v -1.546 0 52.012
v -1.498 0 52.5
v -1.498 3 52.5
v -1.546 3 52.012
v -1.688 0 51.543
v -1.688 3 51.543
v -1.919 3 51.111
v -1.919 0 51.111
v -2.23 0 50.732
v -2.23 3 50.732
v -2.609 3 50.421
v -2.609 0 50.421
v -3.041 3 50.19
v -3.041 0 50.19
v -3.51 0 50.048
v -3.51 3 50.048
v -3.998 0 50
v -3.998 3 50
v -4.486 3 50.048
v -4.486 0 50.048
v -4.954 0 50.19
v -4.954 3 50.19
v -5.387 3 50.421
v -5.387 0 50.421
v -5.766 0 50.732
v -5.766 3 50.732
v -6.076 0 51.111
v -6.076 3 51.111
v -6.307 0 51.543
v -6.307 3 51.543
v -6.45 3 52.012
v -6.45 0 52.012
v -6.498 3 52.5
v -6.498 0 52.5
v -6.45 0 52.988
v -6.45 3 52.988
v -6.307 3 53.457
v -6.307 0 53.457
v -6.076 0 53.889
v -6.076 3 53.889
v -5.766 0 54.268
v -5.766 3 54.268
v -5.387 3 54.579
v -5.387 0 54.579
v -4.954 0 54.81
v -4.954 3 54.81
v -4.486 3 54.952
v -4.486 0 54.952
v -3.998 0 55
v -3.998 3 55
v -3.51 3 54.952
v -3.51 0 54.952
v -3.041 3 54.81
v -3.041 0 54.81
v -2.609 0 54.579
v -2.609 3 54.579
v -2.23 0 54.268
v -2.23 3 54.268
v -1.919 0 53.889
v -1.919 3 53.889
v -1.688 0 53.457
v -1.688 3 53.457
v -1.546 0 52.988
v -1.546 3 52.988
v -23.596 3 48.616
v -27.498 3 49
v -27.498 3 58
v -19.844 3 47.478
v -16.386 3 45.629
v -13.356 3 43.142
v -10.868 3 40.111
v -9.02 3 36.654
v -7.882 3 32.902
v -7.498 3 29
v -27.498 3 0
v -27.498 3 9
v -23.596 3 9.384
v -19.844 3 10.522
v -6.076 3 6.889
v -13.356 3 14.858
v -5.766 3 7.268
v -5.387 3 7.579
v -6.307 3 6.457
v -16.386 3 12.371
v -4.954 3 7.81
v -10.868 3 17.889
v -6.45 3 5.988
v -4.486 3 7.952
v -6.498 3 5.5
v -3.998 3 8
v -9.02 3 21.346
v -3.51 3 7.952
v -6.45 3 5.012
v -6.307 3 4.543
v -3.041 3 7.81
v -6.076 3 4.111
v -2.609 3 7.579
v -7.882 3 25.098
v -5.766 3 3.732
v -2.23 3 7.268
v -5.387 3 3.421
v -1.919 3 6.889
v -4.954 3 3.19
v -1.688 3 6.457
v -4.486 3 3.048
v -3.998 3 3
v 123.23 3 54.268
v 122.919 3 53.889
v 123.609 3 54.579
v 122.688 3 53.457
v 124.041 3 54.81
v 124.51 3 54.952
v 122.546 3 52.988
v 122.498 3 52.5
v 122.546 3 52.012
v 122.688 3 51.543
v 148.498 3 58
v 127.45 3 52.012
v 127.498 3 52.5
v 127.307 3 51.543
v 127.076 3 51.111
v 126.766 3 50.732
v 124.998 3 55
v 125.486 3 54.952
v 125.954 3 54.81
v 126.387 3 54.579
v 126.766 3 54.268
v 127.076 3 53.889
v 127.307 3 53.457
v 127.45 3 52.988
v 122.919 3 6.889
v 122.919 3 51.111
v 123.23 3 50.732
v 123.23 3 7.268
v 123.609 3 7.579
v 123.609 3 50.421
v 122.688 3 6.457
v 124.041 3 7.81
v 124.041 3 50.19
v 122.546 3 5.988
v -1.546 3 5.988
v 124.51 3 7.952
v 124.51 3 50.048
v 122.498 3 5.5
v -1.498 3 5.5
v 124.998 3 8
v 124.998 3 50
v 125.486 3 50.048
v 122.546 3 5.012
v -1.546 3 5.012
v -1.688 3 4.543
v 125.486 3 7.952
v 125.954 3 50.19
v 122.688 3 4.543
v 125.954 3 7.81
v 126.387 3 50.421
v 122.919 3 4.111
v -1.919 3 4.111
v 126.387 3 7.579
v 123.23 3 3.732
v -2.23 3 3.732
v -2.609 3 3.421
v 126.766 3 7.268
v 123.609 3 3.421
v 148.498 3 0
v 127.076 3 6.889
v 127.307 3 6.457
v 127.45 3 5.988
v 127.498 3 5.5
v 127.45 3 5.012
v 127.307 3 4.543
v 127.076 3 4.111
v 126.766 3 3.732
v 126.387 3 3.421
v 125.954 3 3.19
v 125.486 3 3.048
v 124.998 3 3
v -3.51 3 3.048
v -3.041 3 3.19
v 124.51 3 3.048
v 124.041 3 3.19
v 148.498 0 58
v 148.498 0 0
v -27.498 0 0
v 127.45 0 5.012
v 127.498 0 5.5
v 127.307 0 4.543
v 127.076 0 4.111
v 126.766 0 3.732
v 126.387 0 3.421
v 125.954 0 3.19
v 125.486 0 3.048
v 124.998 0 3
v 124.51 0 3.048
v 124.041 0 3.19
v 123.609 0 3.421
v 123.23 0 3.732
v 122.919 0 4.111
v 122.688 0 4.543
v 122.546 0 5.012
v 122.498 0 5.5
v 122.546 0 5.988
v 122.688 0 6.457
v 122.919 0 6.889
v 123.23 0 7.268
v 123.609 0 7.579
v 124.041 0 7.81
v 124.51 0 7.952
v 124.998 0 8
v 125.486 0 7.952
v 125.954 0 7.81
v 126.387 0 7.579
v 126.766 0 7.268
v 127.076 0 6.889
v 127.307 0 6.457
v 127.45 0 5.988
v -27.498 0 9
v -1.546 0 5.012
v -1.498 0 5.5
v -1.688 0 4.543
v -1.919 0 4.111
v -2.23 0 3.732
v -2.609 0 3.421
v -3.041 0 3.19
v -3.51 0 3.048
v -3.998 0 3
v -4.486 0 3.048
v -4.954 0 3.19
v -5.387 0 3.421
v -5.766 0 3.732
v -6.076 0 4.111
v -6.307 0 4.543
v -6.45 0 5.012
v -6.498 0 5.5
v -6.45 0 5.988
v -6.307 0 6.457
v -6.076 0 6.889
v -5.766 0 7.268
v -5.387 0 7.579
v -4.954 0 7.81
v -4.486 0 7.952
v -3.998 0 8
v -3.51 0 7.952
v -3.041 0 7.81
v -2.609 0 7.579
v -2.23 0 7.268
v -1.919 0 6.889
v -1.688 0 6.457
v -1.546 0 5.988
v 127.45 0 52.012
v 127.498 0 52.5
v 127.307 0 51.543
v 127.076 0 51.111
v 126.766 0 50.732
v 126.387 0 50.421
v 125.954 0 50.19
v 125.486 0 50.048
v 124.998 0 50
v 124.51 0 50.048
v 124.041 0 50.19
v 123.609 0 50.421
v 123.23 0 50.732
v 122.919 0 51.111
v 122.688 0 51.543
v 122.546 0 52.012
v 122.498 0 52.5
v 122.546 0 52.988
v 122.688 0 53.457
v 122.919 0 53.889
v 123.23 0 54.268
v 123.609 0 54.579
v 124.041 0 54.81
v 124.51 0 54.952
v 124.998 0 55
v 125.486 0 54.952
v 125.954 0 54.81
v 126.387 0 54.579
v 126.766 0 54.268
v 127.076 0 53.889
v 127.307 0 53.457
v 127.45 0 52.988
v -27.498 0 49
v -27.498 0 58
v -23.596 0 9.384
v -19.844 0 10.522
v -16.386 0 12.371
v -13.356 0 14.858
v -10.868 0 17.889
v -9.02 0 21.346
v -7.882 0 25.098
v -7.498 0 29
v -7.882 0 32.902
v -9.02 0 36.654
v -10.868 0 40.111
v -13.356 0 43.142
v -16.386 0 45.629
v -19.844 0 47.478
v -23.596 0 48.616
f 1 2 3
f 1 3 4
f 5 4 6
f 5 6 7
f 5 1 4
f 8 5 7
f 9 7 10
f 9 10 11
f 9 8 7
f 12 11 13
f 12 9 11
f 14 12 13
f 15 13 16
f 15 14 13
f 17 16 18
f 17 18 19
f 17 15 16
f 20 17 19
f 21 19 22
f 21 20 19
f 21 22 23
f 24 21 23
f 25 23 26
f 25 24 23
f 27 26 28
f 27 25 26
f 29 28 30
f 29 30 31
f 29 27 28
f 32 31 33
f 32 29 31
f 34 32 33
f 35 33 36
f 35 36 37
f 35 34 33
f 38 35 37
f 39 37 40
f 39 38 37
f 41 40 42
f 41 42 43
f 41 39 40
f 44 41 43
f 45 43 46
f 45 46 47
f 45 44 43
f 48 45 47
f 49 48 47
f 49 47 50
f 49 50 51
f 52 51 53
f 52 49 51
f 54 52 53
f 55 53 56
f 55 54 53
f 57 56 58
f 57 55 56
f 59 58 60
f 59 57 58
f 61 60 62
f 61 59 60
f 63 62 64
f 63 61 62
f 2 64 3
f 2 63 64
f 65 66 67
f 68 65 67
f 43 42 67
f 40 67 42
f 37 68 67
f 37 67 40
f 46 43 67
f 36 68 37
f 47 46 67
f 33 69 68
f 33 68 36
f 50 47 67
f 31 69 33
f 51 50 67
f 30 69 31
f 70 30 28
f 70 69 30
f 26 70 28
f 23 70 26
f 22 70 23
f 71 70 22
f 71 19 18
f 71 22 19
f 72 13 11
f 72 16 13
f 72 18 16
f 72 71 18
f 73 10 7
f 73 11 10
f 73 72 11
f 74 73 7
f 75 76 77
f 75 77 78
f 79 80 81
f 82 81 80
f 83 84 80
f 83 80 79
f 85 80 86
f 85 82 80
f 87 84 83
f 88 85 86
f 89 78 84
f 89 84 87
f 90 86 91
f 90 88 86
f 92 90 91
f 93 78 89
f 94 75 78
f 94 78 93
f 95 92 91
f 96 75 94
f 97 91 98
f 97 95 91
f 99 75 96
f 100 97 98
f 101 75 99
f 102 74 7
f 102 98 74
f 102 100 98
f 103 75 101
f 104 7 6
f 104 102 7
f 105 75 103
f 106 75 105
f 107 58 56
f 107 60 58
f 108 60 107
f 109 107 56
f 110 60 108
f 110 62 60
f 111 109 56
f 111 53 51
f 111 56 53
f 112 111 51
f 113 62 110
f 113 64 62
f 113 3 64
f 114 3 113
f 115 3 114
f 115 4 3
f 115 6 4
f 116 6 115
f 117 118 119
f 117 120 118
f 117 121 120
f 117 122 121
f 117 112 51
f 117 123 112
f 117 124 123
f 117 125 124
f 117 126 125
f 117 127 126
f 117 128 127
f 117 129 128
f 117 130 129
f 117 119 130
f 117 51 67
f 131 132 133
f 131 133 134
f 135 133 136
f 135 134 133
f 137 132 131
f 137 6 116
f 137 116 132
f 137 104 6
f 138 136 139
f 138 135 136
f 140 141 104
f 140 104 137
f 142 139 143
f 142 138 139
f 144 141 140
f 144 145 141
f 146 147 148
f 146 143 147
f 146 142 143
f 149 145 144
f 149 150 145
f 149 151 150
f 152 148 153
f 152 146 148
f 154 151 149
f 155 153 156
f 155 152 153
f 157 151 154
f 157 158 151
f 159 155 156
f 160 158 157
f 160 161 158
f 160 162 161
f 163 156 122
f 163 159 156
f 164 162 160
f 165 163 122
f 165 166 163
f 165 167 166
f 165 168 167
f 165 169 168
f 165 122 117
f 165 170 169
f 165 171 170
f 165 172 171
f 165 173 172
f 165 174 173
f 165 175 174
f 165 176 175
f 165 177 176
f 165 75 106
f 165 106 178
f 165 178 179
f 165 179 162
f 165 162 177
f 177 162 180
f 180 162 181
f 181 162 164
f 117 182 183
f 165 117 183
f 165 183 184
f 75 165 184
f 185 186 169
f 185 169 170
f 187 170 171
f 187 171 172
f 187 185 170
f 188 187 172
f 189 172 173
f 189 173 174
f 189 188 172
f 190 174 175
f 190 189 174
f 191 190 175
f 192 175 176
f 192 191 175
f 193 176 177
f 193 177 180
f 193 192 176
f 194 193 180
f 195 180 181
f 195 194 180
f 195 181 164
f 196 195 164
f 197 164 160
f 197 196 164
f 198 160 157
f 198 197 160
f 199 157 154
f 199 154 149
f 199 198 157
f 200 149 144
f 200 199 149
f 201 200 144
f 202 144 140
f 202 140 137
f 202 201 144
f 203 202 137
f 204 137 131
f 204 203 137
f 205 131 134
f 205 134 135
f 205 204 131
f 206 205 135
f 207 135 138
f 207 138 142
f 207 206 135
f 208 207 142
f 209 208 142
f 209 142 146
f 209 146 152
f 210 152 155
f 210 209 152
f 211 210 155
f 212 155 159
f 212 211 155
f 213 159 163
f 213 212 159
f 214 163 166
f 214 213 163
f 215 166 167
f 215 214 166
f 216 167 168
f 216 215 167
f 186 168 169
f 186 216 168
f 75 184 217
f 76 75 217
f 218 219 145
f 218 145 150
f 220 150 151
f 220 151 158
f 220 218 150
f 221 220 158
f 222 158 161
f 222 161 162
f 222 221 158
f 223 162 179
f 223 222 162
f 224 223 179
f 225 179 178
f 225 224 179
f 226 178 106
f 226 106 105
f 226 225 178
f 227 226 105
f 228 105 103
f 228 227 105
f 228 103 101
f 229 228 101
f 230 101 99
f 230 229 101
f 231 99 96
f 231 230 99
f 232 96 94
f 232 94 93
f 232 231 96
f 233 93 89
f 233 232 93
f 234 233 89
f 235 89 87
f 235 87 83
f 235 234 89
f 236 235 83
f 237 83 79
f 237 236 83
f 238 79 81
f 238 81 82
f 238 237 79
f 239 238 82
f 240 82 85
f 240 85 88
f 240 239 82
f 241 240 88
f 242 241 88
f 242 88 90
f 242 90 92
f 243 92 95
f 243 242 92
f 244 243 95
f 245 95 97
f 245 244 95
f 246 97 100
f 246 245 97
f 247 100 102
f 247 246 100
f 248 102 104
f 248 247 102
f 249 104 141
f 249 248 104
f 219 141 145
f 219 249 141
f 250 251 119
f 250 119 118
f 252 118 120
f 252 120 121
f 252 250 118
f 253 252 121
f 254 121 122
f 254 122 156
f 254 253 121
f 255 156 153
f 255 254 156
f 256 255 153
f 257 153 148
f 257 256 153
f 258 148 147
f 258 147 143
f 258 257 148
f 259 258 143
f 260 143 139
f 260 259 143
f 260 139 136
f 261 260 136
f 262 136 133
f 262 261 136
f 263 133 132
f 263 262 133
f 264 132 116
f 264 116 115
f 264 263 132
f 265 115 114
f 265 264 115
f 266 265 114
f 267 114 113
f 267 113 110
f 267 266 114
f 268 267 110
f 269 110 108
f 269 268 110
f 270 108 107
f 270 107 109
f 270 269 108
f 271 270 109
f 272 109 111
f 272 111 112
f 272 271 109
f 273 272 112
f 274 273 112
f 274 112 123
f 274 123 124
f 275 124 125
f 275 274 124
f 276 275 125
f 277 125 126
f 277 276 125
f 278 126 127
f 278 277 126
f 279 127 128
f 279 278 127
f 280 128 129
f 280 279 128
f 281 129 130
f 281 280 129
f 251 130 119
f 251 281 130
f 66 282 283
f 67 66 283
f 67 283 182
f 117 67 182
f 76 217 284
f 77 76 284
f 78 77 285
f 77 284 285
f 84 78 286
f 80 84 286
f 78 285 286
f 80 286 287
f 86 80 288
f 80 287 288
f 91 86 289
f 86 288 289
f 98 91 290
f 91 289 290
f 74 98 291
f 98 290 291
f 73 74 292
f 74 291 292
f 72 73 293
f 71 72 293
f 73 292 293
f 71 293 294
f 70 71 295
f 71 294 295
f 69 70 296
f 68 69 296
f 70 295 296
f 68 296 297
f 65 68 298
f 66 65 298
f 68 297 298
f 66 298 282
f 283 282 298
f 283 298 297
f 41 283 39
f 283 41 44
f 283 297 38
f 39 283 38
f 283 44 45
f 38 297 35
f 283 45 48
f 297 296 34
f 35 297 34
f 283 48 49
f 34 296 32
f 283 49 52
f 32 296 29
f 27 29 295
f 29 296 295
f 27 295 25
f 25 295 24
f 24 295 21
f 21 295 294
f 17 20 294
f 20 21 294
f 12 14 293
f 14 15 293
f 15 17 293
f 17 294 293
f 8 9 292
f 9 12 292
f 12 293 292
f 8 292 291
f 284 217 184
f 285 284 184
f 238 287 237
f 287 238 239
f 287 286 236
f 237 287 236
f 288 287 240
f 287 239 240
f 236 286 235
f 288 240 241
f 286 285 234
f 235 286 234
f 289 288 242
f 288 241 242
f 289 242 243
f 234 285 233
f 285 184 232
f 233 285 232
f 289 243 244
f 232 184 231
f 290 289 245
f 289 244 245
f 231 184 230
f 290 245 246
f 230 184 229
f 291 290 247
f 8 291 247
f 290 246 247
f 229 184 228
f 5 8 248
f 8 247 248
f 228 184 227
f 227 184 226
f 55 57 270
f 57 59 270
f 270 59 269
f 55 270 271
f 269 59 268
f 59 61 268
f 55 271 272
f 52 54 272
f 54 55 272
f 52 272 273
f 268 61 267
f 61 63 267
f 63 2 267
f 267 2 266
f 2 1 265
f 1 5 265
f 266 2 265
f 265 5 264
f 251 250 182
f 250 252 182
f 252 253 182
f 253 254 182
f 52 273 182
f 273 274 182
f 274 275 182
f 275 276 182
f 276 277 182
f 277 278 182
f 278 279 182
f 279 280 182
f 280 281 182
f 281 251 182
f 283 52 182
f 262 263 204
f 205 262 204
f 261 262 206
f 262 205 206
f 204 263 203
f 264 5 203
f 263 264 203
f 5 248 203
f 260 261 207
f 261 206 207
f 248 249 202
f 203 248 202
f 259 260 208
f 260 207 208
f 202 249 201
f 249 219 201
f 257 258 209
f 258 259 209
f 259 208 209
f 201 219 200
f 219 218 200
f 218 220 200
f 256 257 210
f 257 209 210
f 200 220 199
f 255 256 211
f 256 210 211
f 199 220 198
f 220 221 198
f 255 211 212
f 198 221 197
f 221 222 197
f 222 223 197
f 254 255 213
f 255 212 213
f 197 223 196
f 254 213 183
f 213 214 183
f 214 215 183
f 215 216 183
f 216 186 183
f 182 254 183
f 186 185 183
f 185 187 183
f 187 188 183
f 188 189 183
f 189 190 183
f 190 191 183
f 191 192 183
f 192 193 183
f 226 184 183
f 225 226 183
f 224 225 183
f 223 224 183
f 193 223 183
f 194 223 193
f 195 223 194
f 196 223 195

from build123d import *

# Parameters (mm, degrees)
SKETCH1_W              = 121
SKETCH1_H              = 58
BOSS_EXTRUDE1_DEPTH    = 3
SKETCH2_W              = 3
SKETCH2_H              = 58
BOSS_EXTRUDE2_DEPTH    = 29
SKETCH3_R              = 2.5
CUT_EXTRUDE1_DEPTH     = 29
CUT_EXTRUDE2_START     = -29
SKETCH4_R              = 2.5
CUT_EXTRUDE2_DEPTH     = 29
CONVERT_SOLID1_DEPTH   = 58
CONVERT_SOLID1_2_DEPTH = 58
UNFOLD1_START          = 3
UNFOLD1_OUTLINE_W      = 121
UNFOLD1_OUTLINE_H      = 58
UNFOLD1_DEPTH          = 29
UNFOLD1_2_OUTLINE_R    = 2.5
UNFOLD1_2_DEPTH        = 3


# Read off the part's stored shape, not the designer's step: Convert-Solid1, Unfold1
with BuildPart() as part:
    # Sketch1 → Boss-Extrude1 (new body)
    with BuildSketch(Plane(origin=(0, 0, 0), x_dir=(1, 0, 0), z_dir=(0, 1, 0))):
        with Locations((60.5, -29)):
            Rectangle(SKETCH1_W, SKETCH1_H)
    extrude(amount=BOSS_EXTRUDE1_DEPTH)

    # Sketch2 → Boss-Extrude2 (add)
    with BuildSketch(Plane(origin=(0, 3, 0), x_dir=(1, 0, 0), z_dir=(0, 1, 0))):
        with Locations((1.5, -29)):
            Rectangle(SKETCH2_W, SKETCH2_H)
        with Locations((119.5, -29)):
            Rectangle(SKETCH2_W, SKETCH2_H)
    extrude(amount=BOSS_EXTRUDE2_DEPTH)

    # Sketch3 → Cut-Extrude1 (cut)
    with BuildSketch(Plane.ZY):
        with Locations((5.5, 8.5)):
            Circle(SKETCH3_R)
        with Locations((52.5, 8.5)):
            Circle(SKETCH3_R)
        with BuildLine():
            Line((9, 32), (49, 32))
            ThreePointArc((49, 32), (29, 12), (9, 32))
        make_face()
    extrude(amount=-CUT_EXTRUDE1_DEPTH, mode=Mode.SUBTRACT)

    # Sketch4 → Cut-Extrude2 (cut)
    with BuildSketch(Plane(origin=(121, 0, 0), x_dir=(0, 0, -1), z_dir=(1, 0, 0)).offset(CUT_EXTRUDE2_START)):
        with Locations(Location((-52.5, 8.5, 0), (0, 0, 180))):
            Circle(SKETCH4_R)
        with Locations(Location((-5.5, 8.5, 0), (0, 0, 180))):
            Circle(SKETCH4_R)
    extrude(amount=CUT_EXTRUDE2_DEPTH, mode=Mode.SUBTRACT)

    # Convert-Solid1 outline → Convert-Solid1 (cut)
    with BuildSketch(Plane.XY):
        with BuildLine():
            Line((0, 0), (5, 0))
            ThreePointArc((5, 0), (1.464466094, 1.464466094), (0, 5))
            Line((0, 5), (0, 0))
        make_face()
        with BuildLine():
            ThreePointArc((121, 5), (119.535533906, 1.464466094), (116, 0))
            Line((116, 0), (121, 0))
            Line((121, 0), (121, 5))
        make_face()
    extrude(amount=CONVERT_SOLID1_DEPTH, mode=Mode.SUBTRACT)

    # Convert-Solid1 2 outline → Convert-Solid1 2 (add)
    with BuildSketch(Plane.XY):
        with BuildLine():
            Line((3, 3), (5, 3))
            ThreePointArc((5, 3), (3.585786438, 3.585786438), (3, 5))
            Line((3, 5), (3, 3))
        make_face()
        with BuildLine():
            ThreePointArc((118, 5), (117.414213562, 3.585786438), (116, 3))
            Line((116, 3), (118, 3))
            Line((118, 3), (118, 5))
        make_face()
    extrude(amount=CONVERT_SOLID1_2_DEPTH)

    # Unfold1 outline → Unfold1 (cut)
    with BuildSketch(Plane(origin=(0, 0, 0), x_dir=(1, 0, 0), z_dir=(0, 1, 0)).offset(UNFOLD1_START)):
        with Locations((60.5, -29)):
            Rectangle(UNFOLD1_OUTLINE_W, UNFOLD1_OUTLINE_H)
    extrude(amount=UNFOLD1_DEPTH, mode=Mode.SUBTRACT)

    # Unfold1 2 outline → Unfold1 2 (add)
    with BuildSketch(Plane(origin=(0, 0, 0), x_dir=(1, 0, 0), z_dir=(0, 1, 0))):
        with BuildLine():
            Line((-27.497787144, 0), (-27.497787144, -9))
            ThreePointArc((-27.497787144, -9), (-7.497787144, -29), (-27.497787144, -49))
            Line((-27.497787144, -49), (-27.497787144, -58))
            Line((-27.497787144, -58), (148.497787144, -58))
            Line((148.497787144, -58), (148.497787144, 0))
            Line((148.497787144, 0), (-27.497787144, 0))
        make_face()
        with Locations((124.997787144, -5.5)):
            Circle(UNFOLD1_2_OUTLINE_R, mode=Mode.SUBTRACT)
        with Locations((124.997787144, -52.5)):
            Circle(UNFOLD1_2_OUTLINE_R, mode=Mode.SUBTRACT)
        with Locations((-3.997787144, -5.5)):
            Circle(UNFOLD1_2_OUTLINE_R, mode=Mode.SUBTRACT)
        with Locations((-3.997787144, -52.5)):
            Circle(UNFOLD1_2_OUTLINE_R, mode=Mode.SUBTRACT)
    extrude(amount=UNFOLD1_2_DEPTH)


solid = part.part
